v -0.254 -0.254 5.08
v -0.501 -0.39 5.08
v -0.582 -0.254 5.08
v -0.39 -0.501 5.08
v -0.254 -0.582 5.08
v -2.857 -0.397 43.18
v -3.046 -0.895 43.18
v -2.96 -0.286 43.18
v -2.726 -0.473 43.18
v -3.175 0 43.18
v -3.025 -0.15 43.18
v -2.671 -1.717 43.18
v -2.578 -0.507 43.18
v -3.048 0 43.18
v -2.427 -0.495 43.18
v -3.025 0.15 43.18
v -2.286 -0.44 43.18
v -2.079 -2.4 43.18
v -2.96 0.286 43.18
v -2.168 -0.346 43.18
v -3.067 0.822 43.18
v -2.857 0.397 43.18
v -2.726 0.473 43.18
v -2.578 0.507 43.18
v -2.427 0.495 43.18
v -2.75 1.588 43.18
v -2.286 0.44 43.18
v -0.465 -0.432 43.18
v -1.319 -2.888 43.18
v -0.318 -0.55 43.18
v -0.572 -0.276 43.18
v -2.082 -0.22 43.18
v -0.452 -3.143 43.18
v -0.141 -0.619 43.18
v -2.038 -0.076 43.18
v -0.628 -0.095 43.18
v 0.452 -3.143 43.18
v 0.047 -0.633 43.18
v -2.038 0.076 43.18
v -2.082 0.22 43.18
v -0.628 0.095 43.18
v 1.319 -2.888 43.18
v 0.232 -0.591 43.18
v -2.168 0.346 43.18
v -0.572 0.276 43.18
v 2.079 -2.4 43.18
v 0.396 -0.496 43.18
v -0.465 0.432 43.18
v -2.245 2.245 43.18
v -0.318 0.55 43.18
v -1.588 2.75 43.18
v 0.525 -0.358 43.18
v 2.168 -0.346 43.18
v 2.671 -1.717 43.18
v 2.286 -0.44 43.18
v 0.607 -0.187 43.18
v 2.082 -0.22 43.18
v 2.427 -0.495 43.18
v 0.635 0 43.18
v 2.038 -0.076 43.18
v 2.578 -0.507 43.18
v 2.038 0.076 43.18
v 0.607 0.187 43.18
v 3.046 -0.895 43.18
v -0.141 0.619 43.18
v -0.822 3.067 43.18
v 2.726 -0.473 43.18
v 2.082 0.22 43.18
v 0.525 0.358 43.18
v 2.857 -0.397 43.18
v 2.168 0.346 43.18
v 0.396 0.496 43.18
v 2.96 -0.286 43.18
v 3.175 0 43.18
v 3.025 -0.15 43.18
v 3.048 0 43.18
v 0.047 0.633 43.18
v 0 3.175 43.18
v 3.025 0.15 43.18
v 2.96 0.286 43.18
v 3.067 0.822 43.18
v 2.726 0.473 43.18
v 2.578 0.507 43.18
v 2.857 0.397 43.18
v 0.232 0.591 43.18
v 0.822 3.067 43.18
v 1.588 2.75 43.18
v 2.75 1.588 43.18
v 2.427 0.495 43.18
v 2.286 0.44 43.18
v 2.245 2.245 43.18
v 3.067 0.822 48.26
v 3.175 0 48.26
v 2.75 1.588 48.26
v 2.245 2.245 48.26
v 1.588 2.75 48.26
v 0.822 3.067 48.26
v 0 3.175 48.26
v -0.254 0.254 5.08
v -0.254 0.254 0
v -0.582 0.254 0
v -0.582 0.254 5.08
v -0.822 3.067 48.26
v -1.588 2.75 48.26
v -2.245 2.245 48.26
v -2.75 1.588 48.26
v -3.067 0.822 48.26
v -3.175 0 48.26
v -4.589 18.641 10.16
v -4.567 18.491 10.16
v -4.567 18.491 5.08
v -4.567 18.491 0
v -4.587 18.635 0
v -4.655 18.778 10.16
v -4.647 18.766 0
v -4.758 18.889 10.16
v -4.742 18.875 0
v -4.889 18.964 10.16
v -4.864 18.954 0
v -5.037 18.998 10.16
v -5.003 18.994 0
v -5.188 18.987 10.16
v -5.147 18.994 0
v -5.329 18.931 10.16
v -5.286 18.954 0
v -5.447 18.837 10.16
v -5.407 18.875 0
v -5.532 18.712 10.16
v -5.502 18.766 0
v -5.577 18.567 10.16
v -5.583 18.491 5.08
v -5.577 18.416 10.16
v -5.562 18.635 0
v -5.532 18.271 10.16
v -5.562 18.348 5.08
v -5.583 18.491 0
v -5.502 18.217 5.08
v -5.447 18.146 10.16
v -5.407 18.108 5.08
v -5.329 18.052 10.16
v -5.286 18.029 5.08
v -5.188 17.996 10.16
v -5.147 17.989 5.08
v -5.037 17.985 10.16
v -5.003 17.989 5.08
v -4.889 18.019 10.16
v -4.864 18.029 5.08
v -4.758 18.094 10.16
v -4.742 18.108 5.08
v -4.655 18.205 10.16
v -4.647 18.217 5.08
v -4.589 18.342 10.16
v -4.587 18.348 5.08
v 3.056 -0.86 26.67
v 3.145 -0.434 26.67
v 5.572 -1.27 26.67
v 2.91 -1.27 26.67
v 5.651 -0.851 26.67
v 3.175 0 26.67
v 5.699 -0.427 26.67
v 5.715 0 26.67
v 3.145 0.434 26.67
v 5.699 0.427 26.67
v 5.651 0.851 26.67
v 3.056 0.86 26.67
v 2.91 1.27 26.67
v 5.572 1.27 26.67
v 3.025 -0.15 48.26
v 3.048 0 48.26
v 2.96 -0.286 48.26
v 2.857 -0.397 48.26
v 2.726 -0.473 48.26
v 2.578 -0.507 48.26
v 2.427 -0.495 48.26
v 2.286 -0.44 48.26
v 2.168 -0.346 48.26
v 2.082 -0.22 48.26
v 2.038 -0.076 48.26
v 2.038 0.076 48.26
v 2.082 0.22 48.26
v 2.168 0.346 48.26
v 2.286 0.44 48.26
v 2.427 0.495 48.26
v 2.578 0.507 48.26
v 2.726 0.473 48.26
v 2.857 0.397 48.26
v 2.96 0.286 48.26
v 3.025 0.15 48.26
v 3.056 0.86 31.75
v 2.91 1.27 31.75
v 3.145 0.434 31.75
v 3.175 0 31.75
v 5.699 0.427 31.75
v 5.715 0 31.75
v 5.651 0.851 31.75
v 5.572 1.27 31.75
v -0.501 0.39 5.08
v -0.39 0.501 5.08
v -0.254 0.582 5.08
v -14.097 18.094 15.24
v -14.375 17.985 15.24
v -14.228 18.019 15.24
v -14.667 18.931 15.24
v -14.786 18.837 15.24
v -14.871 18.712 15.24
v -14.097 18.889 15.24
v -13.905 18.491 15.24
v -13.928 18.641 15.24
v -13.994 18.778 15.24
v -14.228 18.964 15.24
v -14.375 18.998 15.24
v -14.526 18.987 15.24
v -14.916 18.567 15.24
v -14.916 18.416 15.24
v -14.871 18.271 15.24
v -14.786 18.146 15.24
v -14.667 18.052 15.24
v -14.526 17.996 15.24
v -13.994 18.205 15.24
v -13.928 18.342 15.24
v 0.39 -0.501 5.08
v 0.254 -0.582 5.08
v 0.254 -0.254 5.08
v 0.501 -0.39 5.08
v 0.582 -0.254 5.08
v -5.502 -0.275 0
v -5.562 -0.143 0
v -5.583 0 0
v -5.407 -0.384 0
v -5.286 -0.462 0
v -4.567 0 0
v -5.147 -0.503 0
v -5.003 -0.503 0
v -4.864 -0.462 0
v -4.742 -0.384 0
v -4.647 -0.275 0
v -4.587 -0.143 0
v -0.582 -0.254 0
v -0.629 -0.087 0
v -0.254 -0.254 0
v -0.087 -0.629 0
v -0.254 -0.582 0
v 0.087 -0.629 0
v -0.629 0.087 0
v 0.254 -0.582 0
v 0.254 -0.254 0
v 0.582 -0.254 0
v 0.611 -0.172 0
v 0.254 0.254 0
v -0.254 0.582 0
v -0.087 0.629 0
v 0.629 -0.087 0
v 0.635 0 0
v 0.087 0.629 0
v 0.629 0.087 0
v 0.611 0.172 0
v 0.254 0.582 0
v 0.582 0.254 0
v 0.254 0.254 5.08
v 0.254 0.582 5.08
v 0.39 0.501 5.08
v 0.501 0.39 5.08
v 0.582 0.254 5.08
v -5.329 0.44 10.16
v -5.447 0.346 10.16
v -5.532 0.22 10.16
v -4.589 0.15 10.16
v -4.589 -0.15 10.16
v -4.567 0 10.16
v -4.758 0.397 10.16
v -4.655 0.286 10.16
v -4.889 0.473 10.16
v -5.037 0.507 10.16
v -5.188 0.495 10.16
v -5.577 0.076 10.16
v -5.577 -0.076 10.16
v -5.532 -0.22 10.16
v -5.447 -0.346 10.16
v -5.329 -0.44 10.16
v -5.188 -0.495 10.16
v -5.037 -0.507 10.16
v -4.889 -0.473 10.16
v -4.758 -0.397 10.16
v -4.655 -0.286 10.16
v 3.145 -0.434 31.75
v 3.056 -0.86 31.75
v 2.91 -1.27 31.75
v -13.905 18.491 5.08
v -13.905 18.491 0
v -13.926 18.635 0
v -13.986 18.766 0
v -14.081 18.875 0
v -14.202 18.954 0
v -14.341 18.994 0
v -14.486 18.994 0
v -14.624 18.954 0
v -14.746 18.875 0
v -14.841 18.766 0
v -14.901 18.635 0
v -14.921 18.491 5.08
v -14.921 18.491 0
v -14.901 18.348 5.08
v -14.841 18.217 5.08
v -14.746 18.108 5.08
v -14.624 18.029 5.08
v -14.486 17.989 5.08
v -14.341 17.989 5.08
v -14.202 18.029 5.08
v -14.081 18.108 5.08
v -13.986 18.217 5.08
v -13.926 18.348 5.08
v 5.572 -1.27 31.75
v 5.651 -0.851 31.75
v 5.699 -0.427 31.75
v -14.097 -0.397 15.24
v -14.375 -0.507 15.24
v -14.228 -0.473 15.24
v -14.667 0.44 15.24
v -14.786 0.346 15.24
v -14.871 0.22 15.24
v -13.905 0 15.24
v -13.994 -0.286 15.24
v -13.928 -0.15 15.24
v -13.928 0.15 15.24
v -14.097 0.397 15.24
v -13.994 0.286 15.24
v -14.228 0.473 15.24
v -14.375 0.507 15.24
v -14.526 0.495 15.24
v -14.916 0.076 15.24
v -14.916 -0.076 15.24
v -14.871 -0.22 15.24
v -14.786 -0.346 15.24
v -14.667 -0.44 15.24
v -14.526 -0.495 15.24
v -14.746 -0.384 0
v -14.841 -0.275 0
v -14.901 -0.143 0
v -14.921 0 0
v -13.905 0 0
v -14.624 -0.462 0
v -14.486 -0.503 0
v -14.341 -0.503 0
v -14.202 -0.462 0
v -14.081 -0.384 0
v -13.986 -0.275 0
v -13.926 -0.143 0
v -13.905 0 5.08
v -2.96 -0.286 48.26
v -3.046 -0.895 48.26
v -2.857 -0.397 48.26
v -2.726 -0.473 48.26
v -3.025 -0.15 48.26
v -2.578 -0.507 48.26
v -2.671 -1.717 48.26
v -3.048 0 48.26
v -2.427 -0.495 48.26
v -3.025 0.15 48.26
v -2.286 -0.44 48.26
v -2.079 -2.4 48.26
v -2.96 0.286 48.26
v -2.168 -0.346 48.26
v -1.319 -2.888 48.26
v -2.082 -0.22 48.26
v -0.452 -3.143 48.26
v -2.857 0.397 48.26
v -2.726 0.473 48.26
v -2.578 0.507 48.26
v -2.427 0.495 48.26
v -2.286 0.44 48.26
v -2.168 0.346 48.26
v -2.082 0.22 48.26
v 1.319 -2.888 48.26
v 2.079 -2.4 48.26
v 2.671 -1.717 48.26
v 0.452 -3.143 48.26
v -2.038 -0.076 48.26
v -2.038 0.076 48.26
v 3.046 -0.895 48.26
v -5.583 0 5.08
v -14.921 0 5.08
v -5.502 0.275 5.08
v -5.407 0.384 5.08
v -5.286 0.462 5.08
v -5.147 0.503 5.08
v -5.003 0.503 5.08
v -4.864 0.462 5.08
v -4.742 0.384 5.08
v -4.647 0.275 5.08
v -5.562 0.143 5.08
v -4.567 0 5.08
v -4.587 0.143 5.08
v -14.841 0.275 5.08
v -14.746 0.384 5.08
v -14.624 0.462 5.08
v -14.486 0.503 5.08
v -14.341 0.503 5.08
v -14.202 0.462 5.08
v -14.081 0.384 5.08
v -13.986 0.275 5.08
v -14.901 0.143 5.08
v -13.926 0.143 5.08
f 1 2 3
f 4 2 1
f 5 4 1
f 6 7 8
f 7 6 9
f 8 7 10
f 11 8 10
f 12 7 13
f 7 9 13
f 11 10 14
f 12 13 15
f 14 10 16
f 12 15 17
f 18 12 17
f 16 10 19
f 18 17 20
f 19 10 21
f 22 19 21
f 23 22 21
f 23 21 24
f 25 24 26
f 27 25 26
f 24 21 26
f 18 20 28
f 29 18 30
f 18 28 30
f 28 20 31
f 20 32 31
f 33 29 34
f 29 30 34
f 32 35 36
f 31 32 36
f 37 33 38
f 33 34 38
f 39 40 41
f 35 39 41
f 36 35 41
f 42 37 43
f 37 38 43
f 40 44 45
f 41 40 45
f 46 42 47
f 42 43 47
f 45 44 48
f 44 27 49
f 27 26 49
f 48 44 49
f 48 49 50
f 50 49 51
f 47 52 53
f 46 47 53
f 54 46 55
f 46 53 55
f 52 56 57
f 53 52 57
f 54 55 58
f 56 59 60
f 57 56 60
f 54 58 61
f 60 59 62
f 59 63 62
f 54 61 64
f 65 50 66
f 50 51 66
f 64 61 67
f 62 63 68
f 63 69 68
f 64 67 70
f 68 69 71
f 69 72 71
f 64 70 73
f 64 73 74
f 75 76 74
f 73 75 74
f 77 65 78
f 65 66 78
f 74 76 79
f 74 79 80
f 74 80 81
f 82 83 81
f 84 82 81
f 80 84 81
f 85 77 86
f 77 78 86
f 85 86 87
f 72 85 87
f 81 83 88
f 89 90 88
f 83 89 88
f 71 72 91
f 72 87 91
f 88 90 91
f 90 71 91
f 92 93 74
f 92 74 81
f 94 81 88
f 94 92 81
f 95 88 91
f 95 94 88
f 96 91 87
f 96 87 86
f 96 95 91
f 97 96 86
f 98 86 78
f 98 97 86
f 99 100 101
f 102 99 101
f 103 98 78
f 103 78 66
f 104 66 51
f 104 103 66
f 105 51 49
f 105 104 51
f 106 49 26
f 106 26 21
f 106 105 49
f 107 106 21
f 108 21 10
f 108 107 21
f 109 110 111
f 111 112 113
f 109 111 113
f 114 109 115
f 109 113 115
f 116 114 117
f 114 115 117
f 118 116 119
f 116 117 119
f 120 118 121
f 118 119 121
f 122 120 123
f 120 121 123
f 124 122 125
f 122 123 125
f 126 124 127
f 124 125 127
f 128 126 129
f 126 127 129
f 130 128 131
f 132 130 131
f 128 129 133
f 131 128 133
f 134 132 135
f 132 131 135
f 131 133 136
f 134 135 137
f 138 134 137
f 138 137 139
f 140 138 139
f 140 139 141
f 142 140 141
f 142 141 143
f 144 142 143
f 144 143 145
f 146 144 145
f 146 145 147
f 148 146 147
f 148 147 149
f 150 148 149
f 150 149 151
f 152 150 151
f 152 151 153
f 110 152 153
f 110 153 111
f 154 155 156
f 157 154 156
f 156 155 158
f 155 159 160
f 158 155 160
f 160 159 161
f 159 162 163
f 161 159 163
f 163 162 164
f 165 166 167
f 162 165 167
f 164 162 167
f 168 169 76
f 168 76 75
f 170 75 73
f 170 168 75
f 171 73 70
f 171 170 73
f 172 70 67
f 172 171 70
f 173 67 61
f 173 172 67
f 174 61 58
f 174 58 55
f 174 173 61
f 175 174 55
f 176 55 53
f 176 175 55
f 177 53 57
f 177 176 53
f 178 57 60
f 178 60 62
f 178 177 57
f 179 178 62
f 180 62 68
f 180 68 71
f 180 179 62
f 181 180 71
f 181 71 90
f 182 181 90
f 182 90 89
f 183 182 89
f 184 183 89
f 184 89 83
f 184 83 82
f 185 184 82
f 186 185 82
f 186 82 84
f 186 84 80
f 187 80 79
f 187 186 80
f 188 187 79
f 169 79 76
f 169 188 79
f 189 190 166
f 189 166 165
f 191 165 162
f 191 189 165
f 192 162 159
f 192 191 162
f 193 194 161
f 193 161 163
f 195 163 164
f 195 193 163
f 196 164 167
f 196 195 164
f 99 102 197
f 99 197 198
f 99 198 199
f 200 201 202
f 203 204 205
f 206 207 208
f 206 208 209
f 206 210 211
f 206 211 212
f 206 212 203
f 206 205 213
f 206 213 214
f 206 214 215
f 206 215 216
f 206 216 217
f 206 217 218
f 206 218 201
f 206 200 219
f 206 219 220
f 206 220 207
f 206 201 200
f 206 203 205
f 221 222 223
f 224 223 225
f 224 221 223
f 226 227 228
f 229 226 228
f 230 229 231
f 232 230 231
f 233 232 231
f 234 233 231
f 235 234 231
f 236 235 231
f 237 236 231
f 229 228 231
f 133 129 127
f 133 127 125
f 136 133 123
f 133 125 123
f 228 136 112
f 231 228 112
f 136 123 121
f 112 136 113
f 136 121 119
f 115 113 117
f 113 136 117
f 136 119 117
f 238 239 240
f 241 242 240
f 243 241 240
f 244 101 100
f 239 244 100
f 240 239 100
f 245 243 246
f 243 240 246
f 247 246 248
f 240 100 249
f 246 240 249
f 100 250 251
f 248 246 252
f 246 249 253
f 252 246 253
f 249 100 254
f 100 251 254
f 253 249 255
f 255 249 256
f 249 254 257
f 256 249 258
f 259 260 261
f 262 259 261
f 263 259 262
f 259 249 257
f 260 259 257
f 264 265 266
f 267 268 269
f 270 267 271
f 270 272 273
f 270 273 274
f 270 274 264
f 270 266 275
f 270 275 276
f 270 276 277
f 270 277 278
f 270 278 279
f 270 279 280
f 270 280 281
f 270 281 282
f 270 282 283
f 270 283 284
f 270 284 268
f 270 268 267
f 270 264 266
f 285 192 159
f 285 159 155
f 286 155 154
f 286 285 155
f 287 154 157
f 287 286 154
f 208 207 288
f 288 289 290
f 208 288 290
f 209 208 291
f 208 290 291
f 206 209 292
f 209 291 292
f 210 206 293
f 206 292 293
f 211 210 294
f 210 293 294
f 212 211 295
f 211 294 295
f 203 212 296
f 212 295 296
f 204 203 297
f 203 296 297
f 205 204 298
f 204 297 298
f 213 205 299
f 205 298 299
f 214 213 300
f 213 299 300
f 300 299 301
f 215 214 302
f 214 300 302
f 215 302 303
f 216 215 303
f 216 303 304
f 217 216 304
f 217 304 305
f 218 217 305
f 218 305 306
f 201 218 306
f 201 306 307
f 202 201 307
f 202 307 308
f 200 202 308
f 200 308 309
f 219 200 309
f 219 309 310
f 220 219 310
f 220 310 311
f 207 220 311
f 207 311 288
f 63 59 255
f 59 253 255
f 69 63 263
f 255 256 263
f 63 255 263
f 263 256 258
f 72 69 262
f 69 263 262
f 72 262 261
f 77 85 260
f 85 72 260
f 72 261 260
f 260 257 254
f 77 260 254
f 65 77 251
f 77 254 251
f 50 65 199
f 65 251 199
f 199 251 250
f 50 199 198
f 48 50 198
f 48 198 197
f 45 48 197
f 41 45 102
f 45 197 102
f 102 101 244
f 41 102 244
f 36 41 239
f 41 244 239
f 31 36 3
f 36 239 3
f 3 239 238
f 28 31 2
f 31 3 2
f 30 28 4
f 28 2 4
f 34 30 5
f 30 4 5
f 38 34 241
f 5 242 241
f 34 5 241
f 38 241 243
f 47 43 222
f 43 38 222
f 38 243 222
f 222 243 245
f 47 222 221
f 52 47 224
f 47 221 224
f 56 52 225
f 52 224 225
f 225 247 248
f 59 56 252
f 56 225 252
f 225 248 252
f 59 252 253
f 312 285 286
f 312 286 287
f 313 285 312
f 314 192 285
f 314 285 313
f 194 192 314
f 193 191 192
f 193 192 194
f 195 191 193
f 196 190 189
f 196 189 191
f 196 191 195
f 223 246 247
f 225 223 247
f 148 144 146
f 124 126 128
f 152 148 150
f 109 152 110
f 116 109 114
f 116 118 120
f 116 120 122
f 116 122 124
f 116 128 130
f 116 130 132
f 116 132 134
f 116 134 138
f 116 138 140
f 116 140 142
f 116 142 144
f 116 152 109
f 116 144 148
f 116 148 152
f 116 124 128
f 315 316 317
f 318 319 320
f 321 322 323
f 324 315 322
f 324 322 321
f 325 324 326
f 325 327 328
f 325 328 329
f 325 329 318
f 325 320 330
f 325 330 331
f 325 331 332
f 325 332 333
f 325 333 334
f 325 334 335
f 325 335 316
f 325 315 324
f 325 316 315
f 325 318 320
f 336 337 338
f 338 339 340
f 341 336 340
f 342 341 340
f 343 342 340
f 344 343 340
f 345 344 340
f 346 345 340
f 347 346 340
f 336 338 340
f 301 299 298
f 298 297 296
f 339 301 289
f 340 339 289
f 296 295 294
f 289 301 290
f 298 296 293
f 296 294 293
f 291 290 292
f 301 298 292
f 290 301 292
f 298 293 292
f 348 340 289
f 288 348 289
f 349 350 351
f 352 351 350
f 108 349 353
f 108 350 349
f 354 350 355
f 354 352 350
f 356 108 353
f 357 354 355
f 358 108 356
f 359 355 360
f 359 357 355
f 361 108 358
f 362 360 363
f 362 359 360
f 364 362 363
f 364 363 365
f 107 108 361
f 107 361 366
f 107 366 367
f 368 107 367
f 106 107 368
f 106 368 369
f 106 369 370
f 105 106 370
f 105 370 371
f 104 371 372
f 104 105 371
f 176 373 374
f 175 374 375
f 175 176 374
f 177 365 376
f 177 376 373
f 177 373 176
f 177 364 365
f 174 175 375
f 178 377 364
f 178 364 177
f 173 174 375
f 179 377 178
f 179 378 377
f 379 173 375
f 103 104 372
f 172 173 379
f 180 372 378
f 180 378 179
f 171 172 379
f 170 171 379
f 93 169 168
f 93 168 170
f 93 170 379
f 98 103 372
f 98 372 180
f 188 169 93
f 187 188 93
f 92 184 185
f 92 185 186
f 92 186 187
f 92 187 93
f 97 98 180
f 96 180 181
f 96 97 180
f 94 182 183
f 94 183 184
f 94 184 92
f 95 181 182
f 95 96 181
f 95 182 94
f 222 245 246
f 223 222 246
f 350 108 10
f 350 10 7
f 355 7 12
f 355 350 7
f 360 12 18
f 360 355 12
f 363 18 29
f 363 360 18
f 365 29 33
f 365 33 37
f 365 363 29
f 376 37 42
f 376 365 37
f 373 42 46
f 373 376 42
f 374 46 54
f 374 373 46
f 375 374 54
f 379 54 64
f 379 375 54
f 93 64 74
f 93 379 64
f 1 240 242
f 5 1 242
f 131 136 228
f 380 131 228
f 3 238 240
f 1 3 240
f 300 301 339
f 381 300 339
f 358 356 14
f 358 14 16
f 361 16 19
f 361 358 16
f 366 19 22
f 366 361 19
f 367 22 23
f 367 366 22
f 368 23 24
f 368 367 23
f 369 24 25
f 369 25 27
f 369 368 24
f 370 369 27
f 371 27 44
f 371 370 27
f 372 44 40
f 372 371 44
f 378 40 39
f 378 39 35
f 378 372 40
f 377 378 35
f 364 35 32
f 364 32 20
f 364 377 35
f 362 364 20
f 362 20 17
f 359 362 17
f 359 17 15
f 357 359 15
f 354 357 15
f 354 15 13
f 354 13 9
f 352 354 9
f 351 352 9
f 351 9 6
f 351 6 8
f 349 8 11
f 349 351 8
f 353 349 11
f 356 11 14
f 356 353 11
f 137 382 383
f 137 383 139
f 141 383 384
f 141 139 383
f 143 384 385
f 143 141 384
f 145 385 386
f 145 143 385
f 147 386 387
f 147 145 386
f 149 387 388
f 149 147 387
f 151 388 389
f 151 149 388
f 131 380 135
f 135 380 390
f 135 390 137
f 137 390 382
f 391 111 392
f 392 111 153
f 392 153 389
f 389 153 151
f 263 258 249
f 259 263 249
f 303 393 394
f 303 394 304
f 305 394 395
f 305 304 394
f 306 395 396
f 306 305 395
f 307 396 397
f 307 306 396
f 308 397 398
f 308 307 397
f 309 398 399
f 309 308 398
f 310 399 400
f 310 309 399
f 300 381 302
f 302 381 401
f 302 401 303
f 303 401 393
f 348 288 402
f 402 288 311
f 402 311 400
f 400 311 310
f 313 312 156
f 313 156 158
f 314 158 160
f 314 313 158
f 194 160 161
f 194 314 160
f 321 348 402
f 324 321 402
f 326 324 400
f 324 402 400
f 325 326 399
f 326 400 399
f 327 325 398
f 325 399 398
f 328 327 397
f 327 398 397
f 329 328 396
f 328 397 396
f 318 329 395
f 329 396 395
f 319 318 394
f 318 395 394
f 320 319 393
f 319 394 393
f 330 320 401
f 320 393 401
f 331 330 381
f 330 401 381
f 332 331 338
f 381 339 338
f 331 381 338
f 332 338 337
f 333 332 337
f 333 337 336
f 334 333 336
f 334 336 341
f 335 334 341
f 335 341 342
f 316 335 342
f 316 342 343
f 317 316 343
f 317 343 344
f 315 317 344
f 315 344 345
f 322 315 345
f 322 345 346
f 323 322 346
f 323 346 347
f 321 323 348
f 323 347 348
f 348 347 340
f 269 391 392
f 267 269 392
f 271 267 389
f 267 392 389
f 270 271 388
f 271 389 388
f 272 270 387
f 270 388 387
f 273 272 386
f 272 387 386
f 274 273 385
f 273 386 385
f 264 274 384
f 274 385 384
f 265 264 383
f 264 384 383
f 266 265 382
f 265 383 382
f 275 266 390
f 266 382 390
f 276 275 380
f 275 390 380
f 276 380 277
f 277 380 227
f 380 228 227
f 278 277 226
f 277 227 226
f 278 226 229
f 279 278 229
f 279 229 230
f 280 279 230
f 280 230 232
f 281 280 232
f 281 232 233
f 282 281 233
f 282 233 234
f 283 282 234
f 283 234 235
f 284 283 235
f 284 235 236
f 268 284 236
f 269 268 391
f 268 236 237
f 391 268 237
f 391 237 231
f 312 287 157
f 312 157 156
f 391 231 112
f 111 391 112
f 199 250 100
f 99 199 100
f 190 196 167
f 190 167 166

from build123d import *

# Parameters (mm, degrees)
F0_R      = 0.635
F1_DEPTH  = 48.26
F3_DEPTH  = 5.08
F5_DEPTH  = 5.08
F6_R      = 0.508
F7_DEPTH  = 5.08
F8_R      = 0.508
F9_DEPTH  = 10.16
F12_DEPTH = 5.08
F14_DEPTH = 5.08


with BuildPart() as f1:
    # F0 (on Top) → F1 (new body)
    with BuildSketch(Plane.XY):
        Circle(F0_R)
    extrude(amount=F1_DEPTH)

    # F2 (on face) → F3 (join)
    with BuildSketch(Plane.XY.offset(48.26)):
        with BuildLine():
            Line((3.048, 0), (3.175, 0))
            ThreePointArc((3.175, 0), (2.2450640303, 2.2450640303), (0, 3.175))
            Line((0, 3.175), (0, 0))
            Line((0, 0), (2.032, 0))
            ThreePointArc((2.032, 0), (2.54, 0.508), (3.048, 0))
        make_face()
        with BuildLine():
            ThreePointArc((-3.175, 0), (0, -3.175), (3.175, 0))
            Line((3.175, 0), (3.048, 0))
            ThreePointArc((3.048, 0), (2.54, -0.508), (2.032, 0))
            Line((2.032, 0), (0, 0))
            Line((0, 0), (-2.032, 0))
            ThreePointArc((-2.032, 0), (-2.54, -0.508), (-3.048, 0))
            Line((-3.048, 0), (-3.175, 0))
        make_face()
        with BuildLine():
            Line((0, 0), (0, 3.175))
            ThreePointArc((0, 3.175), (-2.2450640303, 2.2450640303), (-3.175, 0))
            Line((-3.175, 0), (-3.048, 0))
            ThreePointArc((-3.048, 0), (-2.54, 0.508), (-2.032, 0))
            Line((-2.032, 0), (0, 0))
        make_face()
    extrude(amount=-F3_DEPTH)

    # F13 (on face) → F14 (cut)
    with BuildSketch(Plane(origin=(0, 0, 0), x_dir=(1, 0, 0), z_dir=(0, 0, -1))):
        with BuildLine():
            Line((0.254, 0.254), (0.5819871133, 0.254))
            ThreePointArc((0.5819871133, 0.254), (0.4490128061, 0.4490128061), (0.254, 0.5819871133))
            Line((0.254, 0.5819871133), (0.254, 0.254))
        make_face()
        with BuildLine():
            ThreePointArc((0.254, -0.5819871133), (0.4490128061, -0.4490128061), (0.5819871133, -0.254))
            Line((0.5819871133, -0.254), (0.254, -0.254))
            Line((0.254, -0.254), (0.254, -0.5819871133))
        make_face()
        with BuildLine():
            ThreePointArc((-0.254, 0.5819871133), (0, 0.635), (0.254, 0.5819871133))
            Line((0.254, 0.5819871133), (0.254, 4.8890965991))
            Line((0.254, 4.8890965991), (-0.254, 4.8890965991))
            Line((-0.254, 4.8890965991), (-0.254, 0.5819871133))
        make_face()
        with BuildLine():
            Line((0.254, -4.8890965991), (0.254, -0.5819871133))
            ThreePointArc((0.254, -0.5819871133), (0, -0.635), (-0.254, -0.5819871133))
            Line((-0.254, -0.5819871133), (-0.254, -4.8890965991))
            Line((-0.254, -4.8890965991), (0.254, -4.8890965991))
        make_face()
        with BuildLine():
            Line((-0.254, 0.254), (-0.254, 0.5819871133))
            ThreePointArc((-0.254, 0.5819871133), (-0.4490128061, 0.4490128061), (-0.5819871133, 0.254))
            Line((-0.5819871133, 0.254), (-0.254, 0.254))
        make_face()
        with BuildLine():
            ThreePointArc((-0.5819871133, -0.254), (-0.4490128061, -0.4490128061), (-0.254, -0.5819871133))
            Line((-0.254, -0.5819871133), (-0.254, -0.254))
            Line((-0.254, -0.254), (-0.5819871133, -0.254))
        make_face()
    extrude(amount=-F14_DEPTH, mode=Mode.SUBTRACT)


with BuildPart() as f5:
    # F4 (on Top) → F5 (new body)
    with BuildSketch(Plane.XY):
        with BuildLine():
            ThreePointArc((-5.5828010944, 0), (-5.0748010944, -0.508), (-4.5668010944, 0))
            Line((-4.5668010944, 0), (-5.5828010944, 0))
        make_face()
        with BuildLine():
            ThreePointArc((-5.5828010944, 0), (-5.0748010944, 0.508), (-4.5668010944, 0))
            Line((-4.5668010944, 0), (-4.5668010944, 18.4914791188))
            ThreePointArc((-4.5668010944, 18.4914791188), (-5.0748010944, 17.9834791188), (-5.5828010944, 18.4914791188))
            Line((-5.5828010944, 18.4914791188), (-5.5828010944, 0))
        make_face()
        with BuildLine():
            Line((-5.5828010944, 0), (-4.5668010944, 0))
            ThreePointArc((-4.5668010944, 0), (-5.0748010944, 0.508), (-5.5828010944, 0))
        make_face()
        with BuildLine():
            ThreePointArc((-5.5828010944, 18.4914791188), (-5.0748010944, 17.9834791188), (-4.5668010944, 18.4914791188))
            Line((-4.5668010944, 18.4914791188), (-5.5828010944, 18.4914791188))
        make_face()
        with BuildLine():
            Line((-5.5828010944, 18.4914791188), (-4.5668010944, 18.4914791188))
            ThreePointArc((-4.5668010944, 18.4914791188), (-5.0748010944, 18.9994791188), (-5.5828010944, 18.4914791188))
        make_face()
    extrude(amount=F5_DEPTH)

    # F6 (on face) → F7 (join)
    with BuildSketch(Plane.XY.offset(5.08)):
        with Locations((-5.0748010944, 18.4914791188)):
            Circle(F6_R)
        with Locations((-5.0748010944, 0)):
            Circle(F6_R)
    extrude(amount=F7_DEPTH)


with BuildPart() as f5b:
    # F4 (on Top) → F5, piece 2 (new body)
    with BuildSketch(Plane.XY):
        with BuildLine():
            ThreePointArc((-14.9213979021, 0), (-14.4133979021, -0.508), (-13.9053979021, 0))
            Line((-13.9053979021, 0), (-14.4133979021, 0))
            Line((-14.4133979021, 0), (-14.9213979021, 0))
        make_face()
        with BuildLine():
            Line((-14.4133979021, 0), (-13.9053979021, 0))
            ThreePointArc((-13.9053979021, 0), (-14.4133979021, 0.508), (-14.9213979021, 0))
            Line((-14.9213979021, 0), (-14.4133979021, 0))
        make_face()
        with BuildLine():
            ThreePointArc((-14.9213979021, 0), (-14.4133979021, 0.508), (-13.9053979021, 0))
            Line((-13.9053979021, 0), (-13.9053979021, 18.4914791188))
            ThreePointArc((-13.9053979021, 18.4914791188), (-14.4133979021, 17.9834791188), (-14.9213979021, 18.4914791188))
            Line((-14.9213979021, 18.4914791188), (-14.9213979021, 0))
        make_face()
        with BuildLine():
            ThreePointArc((-14.9213979021, 18.4914791188), (-14.4133979021, 17.9834791188), (-13.9053979021, 18.4914791188))
            Line((-13.9053979021, 18.4914791188), (-14.9213979021, 18.4914791188))
        make_face()
        with BuildLine():
            Line((-14.9213979021, 18.4914791188), (-13.9053979021, 18.4914791188))
            ThreePointArc((-13.9053979021, 18.4914791188), (-14.4133979021, 18.9994791188), (-14.9213979021, 18.4914791188))
        make_face()
    extrude(amount=F5_DEPTH)

    # F8 (on face) → F9 (join)
    with BuildSketch(Plane.XY.offset(5.08)):
        with Locations((-14.4133979021, 18.4914791188)):
            Circle(F8_R)
        with Locations((-14.4133979021, 0)):
            Circle(F8_R)
    extrude(amount=F9_DEPTH)


with BuildPart() as f12:
    # F11 (on offset) → F12 (new body)
    with BuildSketch(Plane.XY.offset(31.75)):
        with BuildLine():
            ThreePointArc((2.9099355663, 1.27), (3.1080275436, 0.6486831187), (3.175, 0))
            ThreePointArc((3.175, 0), (3.1080275436, -0.6486831187), (2.9099355663, -1.27))
            Line((2.9099355663, -1.27), (5.572102386, -1.27))
            Line((5.572102386, -1.27), (5.572102386, 1.27))
            Line((5.572102386, 1.27), (2.9099355663, 1.27))
        make_face()
        with BuildLine():
            ThreePointArc((5.715, 0), (5.6791632366, 0.639006989), (5.572102386, 1.27))
            Line((5.572102386, 1.27), (5.572102386, -1.27))
            ThreePointArc((5.572102386, -1.27), (5.6791632366, -0.639006989), (5.715, 0))
        make_face()
    extrude(amount=-F12_DEPTH)


solid = Compound([f1.part, f5.part, f5b.part, f12.part])
